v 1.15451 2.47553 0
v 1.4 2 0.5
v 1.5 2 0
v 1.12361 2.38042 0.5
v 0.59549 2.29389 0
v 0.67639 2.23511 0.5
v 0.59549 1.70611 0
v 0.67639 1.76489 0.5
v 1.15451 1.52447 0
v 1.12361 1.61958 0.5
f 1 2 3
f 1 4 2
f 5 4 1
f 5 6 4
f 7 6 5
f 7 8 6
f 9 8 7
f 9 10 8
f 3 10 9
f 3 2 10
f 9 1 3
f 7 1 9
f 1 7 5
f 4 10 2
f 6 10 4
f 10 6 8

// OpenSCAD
module via(position, radius1, radius2, height, flip, z_offset){
	translate([position[0], position[1], z_offset])
	{
		if(flip)
		{
			rotate([180,0,0])
			{
                cylinder(height, r1 = radius1, r2 = radius2);
			}
		}
		else 
		{
			cylinder(height, r1 = radius1, r2 = radius2);
		}
	}
}

via(position = [1,2],radius1 = .5,radius2 = .4,height=.5,flip=false,z_offset=0);
